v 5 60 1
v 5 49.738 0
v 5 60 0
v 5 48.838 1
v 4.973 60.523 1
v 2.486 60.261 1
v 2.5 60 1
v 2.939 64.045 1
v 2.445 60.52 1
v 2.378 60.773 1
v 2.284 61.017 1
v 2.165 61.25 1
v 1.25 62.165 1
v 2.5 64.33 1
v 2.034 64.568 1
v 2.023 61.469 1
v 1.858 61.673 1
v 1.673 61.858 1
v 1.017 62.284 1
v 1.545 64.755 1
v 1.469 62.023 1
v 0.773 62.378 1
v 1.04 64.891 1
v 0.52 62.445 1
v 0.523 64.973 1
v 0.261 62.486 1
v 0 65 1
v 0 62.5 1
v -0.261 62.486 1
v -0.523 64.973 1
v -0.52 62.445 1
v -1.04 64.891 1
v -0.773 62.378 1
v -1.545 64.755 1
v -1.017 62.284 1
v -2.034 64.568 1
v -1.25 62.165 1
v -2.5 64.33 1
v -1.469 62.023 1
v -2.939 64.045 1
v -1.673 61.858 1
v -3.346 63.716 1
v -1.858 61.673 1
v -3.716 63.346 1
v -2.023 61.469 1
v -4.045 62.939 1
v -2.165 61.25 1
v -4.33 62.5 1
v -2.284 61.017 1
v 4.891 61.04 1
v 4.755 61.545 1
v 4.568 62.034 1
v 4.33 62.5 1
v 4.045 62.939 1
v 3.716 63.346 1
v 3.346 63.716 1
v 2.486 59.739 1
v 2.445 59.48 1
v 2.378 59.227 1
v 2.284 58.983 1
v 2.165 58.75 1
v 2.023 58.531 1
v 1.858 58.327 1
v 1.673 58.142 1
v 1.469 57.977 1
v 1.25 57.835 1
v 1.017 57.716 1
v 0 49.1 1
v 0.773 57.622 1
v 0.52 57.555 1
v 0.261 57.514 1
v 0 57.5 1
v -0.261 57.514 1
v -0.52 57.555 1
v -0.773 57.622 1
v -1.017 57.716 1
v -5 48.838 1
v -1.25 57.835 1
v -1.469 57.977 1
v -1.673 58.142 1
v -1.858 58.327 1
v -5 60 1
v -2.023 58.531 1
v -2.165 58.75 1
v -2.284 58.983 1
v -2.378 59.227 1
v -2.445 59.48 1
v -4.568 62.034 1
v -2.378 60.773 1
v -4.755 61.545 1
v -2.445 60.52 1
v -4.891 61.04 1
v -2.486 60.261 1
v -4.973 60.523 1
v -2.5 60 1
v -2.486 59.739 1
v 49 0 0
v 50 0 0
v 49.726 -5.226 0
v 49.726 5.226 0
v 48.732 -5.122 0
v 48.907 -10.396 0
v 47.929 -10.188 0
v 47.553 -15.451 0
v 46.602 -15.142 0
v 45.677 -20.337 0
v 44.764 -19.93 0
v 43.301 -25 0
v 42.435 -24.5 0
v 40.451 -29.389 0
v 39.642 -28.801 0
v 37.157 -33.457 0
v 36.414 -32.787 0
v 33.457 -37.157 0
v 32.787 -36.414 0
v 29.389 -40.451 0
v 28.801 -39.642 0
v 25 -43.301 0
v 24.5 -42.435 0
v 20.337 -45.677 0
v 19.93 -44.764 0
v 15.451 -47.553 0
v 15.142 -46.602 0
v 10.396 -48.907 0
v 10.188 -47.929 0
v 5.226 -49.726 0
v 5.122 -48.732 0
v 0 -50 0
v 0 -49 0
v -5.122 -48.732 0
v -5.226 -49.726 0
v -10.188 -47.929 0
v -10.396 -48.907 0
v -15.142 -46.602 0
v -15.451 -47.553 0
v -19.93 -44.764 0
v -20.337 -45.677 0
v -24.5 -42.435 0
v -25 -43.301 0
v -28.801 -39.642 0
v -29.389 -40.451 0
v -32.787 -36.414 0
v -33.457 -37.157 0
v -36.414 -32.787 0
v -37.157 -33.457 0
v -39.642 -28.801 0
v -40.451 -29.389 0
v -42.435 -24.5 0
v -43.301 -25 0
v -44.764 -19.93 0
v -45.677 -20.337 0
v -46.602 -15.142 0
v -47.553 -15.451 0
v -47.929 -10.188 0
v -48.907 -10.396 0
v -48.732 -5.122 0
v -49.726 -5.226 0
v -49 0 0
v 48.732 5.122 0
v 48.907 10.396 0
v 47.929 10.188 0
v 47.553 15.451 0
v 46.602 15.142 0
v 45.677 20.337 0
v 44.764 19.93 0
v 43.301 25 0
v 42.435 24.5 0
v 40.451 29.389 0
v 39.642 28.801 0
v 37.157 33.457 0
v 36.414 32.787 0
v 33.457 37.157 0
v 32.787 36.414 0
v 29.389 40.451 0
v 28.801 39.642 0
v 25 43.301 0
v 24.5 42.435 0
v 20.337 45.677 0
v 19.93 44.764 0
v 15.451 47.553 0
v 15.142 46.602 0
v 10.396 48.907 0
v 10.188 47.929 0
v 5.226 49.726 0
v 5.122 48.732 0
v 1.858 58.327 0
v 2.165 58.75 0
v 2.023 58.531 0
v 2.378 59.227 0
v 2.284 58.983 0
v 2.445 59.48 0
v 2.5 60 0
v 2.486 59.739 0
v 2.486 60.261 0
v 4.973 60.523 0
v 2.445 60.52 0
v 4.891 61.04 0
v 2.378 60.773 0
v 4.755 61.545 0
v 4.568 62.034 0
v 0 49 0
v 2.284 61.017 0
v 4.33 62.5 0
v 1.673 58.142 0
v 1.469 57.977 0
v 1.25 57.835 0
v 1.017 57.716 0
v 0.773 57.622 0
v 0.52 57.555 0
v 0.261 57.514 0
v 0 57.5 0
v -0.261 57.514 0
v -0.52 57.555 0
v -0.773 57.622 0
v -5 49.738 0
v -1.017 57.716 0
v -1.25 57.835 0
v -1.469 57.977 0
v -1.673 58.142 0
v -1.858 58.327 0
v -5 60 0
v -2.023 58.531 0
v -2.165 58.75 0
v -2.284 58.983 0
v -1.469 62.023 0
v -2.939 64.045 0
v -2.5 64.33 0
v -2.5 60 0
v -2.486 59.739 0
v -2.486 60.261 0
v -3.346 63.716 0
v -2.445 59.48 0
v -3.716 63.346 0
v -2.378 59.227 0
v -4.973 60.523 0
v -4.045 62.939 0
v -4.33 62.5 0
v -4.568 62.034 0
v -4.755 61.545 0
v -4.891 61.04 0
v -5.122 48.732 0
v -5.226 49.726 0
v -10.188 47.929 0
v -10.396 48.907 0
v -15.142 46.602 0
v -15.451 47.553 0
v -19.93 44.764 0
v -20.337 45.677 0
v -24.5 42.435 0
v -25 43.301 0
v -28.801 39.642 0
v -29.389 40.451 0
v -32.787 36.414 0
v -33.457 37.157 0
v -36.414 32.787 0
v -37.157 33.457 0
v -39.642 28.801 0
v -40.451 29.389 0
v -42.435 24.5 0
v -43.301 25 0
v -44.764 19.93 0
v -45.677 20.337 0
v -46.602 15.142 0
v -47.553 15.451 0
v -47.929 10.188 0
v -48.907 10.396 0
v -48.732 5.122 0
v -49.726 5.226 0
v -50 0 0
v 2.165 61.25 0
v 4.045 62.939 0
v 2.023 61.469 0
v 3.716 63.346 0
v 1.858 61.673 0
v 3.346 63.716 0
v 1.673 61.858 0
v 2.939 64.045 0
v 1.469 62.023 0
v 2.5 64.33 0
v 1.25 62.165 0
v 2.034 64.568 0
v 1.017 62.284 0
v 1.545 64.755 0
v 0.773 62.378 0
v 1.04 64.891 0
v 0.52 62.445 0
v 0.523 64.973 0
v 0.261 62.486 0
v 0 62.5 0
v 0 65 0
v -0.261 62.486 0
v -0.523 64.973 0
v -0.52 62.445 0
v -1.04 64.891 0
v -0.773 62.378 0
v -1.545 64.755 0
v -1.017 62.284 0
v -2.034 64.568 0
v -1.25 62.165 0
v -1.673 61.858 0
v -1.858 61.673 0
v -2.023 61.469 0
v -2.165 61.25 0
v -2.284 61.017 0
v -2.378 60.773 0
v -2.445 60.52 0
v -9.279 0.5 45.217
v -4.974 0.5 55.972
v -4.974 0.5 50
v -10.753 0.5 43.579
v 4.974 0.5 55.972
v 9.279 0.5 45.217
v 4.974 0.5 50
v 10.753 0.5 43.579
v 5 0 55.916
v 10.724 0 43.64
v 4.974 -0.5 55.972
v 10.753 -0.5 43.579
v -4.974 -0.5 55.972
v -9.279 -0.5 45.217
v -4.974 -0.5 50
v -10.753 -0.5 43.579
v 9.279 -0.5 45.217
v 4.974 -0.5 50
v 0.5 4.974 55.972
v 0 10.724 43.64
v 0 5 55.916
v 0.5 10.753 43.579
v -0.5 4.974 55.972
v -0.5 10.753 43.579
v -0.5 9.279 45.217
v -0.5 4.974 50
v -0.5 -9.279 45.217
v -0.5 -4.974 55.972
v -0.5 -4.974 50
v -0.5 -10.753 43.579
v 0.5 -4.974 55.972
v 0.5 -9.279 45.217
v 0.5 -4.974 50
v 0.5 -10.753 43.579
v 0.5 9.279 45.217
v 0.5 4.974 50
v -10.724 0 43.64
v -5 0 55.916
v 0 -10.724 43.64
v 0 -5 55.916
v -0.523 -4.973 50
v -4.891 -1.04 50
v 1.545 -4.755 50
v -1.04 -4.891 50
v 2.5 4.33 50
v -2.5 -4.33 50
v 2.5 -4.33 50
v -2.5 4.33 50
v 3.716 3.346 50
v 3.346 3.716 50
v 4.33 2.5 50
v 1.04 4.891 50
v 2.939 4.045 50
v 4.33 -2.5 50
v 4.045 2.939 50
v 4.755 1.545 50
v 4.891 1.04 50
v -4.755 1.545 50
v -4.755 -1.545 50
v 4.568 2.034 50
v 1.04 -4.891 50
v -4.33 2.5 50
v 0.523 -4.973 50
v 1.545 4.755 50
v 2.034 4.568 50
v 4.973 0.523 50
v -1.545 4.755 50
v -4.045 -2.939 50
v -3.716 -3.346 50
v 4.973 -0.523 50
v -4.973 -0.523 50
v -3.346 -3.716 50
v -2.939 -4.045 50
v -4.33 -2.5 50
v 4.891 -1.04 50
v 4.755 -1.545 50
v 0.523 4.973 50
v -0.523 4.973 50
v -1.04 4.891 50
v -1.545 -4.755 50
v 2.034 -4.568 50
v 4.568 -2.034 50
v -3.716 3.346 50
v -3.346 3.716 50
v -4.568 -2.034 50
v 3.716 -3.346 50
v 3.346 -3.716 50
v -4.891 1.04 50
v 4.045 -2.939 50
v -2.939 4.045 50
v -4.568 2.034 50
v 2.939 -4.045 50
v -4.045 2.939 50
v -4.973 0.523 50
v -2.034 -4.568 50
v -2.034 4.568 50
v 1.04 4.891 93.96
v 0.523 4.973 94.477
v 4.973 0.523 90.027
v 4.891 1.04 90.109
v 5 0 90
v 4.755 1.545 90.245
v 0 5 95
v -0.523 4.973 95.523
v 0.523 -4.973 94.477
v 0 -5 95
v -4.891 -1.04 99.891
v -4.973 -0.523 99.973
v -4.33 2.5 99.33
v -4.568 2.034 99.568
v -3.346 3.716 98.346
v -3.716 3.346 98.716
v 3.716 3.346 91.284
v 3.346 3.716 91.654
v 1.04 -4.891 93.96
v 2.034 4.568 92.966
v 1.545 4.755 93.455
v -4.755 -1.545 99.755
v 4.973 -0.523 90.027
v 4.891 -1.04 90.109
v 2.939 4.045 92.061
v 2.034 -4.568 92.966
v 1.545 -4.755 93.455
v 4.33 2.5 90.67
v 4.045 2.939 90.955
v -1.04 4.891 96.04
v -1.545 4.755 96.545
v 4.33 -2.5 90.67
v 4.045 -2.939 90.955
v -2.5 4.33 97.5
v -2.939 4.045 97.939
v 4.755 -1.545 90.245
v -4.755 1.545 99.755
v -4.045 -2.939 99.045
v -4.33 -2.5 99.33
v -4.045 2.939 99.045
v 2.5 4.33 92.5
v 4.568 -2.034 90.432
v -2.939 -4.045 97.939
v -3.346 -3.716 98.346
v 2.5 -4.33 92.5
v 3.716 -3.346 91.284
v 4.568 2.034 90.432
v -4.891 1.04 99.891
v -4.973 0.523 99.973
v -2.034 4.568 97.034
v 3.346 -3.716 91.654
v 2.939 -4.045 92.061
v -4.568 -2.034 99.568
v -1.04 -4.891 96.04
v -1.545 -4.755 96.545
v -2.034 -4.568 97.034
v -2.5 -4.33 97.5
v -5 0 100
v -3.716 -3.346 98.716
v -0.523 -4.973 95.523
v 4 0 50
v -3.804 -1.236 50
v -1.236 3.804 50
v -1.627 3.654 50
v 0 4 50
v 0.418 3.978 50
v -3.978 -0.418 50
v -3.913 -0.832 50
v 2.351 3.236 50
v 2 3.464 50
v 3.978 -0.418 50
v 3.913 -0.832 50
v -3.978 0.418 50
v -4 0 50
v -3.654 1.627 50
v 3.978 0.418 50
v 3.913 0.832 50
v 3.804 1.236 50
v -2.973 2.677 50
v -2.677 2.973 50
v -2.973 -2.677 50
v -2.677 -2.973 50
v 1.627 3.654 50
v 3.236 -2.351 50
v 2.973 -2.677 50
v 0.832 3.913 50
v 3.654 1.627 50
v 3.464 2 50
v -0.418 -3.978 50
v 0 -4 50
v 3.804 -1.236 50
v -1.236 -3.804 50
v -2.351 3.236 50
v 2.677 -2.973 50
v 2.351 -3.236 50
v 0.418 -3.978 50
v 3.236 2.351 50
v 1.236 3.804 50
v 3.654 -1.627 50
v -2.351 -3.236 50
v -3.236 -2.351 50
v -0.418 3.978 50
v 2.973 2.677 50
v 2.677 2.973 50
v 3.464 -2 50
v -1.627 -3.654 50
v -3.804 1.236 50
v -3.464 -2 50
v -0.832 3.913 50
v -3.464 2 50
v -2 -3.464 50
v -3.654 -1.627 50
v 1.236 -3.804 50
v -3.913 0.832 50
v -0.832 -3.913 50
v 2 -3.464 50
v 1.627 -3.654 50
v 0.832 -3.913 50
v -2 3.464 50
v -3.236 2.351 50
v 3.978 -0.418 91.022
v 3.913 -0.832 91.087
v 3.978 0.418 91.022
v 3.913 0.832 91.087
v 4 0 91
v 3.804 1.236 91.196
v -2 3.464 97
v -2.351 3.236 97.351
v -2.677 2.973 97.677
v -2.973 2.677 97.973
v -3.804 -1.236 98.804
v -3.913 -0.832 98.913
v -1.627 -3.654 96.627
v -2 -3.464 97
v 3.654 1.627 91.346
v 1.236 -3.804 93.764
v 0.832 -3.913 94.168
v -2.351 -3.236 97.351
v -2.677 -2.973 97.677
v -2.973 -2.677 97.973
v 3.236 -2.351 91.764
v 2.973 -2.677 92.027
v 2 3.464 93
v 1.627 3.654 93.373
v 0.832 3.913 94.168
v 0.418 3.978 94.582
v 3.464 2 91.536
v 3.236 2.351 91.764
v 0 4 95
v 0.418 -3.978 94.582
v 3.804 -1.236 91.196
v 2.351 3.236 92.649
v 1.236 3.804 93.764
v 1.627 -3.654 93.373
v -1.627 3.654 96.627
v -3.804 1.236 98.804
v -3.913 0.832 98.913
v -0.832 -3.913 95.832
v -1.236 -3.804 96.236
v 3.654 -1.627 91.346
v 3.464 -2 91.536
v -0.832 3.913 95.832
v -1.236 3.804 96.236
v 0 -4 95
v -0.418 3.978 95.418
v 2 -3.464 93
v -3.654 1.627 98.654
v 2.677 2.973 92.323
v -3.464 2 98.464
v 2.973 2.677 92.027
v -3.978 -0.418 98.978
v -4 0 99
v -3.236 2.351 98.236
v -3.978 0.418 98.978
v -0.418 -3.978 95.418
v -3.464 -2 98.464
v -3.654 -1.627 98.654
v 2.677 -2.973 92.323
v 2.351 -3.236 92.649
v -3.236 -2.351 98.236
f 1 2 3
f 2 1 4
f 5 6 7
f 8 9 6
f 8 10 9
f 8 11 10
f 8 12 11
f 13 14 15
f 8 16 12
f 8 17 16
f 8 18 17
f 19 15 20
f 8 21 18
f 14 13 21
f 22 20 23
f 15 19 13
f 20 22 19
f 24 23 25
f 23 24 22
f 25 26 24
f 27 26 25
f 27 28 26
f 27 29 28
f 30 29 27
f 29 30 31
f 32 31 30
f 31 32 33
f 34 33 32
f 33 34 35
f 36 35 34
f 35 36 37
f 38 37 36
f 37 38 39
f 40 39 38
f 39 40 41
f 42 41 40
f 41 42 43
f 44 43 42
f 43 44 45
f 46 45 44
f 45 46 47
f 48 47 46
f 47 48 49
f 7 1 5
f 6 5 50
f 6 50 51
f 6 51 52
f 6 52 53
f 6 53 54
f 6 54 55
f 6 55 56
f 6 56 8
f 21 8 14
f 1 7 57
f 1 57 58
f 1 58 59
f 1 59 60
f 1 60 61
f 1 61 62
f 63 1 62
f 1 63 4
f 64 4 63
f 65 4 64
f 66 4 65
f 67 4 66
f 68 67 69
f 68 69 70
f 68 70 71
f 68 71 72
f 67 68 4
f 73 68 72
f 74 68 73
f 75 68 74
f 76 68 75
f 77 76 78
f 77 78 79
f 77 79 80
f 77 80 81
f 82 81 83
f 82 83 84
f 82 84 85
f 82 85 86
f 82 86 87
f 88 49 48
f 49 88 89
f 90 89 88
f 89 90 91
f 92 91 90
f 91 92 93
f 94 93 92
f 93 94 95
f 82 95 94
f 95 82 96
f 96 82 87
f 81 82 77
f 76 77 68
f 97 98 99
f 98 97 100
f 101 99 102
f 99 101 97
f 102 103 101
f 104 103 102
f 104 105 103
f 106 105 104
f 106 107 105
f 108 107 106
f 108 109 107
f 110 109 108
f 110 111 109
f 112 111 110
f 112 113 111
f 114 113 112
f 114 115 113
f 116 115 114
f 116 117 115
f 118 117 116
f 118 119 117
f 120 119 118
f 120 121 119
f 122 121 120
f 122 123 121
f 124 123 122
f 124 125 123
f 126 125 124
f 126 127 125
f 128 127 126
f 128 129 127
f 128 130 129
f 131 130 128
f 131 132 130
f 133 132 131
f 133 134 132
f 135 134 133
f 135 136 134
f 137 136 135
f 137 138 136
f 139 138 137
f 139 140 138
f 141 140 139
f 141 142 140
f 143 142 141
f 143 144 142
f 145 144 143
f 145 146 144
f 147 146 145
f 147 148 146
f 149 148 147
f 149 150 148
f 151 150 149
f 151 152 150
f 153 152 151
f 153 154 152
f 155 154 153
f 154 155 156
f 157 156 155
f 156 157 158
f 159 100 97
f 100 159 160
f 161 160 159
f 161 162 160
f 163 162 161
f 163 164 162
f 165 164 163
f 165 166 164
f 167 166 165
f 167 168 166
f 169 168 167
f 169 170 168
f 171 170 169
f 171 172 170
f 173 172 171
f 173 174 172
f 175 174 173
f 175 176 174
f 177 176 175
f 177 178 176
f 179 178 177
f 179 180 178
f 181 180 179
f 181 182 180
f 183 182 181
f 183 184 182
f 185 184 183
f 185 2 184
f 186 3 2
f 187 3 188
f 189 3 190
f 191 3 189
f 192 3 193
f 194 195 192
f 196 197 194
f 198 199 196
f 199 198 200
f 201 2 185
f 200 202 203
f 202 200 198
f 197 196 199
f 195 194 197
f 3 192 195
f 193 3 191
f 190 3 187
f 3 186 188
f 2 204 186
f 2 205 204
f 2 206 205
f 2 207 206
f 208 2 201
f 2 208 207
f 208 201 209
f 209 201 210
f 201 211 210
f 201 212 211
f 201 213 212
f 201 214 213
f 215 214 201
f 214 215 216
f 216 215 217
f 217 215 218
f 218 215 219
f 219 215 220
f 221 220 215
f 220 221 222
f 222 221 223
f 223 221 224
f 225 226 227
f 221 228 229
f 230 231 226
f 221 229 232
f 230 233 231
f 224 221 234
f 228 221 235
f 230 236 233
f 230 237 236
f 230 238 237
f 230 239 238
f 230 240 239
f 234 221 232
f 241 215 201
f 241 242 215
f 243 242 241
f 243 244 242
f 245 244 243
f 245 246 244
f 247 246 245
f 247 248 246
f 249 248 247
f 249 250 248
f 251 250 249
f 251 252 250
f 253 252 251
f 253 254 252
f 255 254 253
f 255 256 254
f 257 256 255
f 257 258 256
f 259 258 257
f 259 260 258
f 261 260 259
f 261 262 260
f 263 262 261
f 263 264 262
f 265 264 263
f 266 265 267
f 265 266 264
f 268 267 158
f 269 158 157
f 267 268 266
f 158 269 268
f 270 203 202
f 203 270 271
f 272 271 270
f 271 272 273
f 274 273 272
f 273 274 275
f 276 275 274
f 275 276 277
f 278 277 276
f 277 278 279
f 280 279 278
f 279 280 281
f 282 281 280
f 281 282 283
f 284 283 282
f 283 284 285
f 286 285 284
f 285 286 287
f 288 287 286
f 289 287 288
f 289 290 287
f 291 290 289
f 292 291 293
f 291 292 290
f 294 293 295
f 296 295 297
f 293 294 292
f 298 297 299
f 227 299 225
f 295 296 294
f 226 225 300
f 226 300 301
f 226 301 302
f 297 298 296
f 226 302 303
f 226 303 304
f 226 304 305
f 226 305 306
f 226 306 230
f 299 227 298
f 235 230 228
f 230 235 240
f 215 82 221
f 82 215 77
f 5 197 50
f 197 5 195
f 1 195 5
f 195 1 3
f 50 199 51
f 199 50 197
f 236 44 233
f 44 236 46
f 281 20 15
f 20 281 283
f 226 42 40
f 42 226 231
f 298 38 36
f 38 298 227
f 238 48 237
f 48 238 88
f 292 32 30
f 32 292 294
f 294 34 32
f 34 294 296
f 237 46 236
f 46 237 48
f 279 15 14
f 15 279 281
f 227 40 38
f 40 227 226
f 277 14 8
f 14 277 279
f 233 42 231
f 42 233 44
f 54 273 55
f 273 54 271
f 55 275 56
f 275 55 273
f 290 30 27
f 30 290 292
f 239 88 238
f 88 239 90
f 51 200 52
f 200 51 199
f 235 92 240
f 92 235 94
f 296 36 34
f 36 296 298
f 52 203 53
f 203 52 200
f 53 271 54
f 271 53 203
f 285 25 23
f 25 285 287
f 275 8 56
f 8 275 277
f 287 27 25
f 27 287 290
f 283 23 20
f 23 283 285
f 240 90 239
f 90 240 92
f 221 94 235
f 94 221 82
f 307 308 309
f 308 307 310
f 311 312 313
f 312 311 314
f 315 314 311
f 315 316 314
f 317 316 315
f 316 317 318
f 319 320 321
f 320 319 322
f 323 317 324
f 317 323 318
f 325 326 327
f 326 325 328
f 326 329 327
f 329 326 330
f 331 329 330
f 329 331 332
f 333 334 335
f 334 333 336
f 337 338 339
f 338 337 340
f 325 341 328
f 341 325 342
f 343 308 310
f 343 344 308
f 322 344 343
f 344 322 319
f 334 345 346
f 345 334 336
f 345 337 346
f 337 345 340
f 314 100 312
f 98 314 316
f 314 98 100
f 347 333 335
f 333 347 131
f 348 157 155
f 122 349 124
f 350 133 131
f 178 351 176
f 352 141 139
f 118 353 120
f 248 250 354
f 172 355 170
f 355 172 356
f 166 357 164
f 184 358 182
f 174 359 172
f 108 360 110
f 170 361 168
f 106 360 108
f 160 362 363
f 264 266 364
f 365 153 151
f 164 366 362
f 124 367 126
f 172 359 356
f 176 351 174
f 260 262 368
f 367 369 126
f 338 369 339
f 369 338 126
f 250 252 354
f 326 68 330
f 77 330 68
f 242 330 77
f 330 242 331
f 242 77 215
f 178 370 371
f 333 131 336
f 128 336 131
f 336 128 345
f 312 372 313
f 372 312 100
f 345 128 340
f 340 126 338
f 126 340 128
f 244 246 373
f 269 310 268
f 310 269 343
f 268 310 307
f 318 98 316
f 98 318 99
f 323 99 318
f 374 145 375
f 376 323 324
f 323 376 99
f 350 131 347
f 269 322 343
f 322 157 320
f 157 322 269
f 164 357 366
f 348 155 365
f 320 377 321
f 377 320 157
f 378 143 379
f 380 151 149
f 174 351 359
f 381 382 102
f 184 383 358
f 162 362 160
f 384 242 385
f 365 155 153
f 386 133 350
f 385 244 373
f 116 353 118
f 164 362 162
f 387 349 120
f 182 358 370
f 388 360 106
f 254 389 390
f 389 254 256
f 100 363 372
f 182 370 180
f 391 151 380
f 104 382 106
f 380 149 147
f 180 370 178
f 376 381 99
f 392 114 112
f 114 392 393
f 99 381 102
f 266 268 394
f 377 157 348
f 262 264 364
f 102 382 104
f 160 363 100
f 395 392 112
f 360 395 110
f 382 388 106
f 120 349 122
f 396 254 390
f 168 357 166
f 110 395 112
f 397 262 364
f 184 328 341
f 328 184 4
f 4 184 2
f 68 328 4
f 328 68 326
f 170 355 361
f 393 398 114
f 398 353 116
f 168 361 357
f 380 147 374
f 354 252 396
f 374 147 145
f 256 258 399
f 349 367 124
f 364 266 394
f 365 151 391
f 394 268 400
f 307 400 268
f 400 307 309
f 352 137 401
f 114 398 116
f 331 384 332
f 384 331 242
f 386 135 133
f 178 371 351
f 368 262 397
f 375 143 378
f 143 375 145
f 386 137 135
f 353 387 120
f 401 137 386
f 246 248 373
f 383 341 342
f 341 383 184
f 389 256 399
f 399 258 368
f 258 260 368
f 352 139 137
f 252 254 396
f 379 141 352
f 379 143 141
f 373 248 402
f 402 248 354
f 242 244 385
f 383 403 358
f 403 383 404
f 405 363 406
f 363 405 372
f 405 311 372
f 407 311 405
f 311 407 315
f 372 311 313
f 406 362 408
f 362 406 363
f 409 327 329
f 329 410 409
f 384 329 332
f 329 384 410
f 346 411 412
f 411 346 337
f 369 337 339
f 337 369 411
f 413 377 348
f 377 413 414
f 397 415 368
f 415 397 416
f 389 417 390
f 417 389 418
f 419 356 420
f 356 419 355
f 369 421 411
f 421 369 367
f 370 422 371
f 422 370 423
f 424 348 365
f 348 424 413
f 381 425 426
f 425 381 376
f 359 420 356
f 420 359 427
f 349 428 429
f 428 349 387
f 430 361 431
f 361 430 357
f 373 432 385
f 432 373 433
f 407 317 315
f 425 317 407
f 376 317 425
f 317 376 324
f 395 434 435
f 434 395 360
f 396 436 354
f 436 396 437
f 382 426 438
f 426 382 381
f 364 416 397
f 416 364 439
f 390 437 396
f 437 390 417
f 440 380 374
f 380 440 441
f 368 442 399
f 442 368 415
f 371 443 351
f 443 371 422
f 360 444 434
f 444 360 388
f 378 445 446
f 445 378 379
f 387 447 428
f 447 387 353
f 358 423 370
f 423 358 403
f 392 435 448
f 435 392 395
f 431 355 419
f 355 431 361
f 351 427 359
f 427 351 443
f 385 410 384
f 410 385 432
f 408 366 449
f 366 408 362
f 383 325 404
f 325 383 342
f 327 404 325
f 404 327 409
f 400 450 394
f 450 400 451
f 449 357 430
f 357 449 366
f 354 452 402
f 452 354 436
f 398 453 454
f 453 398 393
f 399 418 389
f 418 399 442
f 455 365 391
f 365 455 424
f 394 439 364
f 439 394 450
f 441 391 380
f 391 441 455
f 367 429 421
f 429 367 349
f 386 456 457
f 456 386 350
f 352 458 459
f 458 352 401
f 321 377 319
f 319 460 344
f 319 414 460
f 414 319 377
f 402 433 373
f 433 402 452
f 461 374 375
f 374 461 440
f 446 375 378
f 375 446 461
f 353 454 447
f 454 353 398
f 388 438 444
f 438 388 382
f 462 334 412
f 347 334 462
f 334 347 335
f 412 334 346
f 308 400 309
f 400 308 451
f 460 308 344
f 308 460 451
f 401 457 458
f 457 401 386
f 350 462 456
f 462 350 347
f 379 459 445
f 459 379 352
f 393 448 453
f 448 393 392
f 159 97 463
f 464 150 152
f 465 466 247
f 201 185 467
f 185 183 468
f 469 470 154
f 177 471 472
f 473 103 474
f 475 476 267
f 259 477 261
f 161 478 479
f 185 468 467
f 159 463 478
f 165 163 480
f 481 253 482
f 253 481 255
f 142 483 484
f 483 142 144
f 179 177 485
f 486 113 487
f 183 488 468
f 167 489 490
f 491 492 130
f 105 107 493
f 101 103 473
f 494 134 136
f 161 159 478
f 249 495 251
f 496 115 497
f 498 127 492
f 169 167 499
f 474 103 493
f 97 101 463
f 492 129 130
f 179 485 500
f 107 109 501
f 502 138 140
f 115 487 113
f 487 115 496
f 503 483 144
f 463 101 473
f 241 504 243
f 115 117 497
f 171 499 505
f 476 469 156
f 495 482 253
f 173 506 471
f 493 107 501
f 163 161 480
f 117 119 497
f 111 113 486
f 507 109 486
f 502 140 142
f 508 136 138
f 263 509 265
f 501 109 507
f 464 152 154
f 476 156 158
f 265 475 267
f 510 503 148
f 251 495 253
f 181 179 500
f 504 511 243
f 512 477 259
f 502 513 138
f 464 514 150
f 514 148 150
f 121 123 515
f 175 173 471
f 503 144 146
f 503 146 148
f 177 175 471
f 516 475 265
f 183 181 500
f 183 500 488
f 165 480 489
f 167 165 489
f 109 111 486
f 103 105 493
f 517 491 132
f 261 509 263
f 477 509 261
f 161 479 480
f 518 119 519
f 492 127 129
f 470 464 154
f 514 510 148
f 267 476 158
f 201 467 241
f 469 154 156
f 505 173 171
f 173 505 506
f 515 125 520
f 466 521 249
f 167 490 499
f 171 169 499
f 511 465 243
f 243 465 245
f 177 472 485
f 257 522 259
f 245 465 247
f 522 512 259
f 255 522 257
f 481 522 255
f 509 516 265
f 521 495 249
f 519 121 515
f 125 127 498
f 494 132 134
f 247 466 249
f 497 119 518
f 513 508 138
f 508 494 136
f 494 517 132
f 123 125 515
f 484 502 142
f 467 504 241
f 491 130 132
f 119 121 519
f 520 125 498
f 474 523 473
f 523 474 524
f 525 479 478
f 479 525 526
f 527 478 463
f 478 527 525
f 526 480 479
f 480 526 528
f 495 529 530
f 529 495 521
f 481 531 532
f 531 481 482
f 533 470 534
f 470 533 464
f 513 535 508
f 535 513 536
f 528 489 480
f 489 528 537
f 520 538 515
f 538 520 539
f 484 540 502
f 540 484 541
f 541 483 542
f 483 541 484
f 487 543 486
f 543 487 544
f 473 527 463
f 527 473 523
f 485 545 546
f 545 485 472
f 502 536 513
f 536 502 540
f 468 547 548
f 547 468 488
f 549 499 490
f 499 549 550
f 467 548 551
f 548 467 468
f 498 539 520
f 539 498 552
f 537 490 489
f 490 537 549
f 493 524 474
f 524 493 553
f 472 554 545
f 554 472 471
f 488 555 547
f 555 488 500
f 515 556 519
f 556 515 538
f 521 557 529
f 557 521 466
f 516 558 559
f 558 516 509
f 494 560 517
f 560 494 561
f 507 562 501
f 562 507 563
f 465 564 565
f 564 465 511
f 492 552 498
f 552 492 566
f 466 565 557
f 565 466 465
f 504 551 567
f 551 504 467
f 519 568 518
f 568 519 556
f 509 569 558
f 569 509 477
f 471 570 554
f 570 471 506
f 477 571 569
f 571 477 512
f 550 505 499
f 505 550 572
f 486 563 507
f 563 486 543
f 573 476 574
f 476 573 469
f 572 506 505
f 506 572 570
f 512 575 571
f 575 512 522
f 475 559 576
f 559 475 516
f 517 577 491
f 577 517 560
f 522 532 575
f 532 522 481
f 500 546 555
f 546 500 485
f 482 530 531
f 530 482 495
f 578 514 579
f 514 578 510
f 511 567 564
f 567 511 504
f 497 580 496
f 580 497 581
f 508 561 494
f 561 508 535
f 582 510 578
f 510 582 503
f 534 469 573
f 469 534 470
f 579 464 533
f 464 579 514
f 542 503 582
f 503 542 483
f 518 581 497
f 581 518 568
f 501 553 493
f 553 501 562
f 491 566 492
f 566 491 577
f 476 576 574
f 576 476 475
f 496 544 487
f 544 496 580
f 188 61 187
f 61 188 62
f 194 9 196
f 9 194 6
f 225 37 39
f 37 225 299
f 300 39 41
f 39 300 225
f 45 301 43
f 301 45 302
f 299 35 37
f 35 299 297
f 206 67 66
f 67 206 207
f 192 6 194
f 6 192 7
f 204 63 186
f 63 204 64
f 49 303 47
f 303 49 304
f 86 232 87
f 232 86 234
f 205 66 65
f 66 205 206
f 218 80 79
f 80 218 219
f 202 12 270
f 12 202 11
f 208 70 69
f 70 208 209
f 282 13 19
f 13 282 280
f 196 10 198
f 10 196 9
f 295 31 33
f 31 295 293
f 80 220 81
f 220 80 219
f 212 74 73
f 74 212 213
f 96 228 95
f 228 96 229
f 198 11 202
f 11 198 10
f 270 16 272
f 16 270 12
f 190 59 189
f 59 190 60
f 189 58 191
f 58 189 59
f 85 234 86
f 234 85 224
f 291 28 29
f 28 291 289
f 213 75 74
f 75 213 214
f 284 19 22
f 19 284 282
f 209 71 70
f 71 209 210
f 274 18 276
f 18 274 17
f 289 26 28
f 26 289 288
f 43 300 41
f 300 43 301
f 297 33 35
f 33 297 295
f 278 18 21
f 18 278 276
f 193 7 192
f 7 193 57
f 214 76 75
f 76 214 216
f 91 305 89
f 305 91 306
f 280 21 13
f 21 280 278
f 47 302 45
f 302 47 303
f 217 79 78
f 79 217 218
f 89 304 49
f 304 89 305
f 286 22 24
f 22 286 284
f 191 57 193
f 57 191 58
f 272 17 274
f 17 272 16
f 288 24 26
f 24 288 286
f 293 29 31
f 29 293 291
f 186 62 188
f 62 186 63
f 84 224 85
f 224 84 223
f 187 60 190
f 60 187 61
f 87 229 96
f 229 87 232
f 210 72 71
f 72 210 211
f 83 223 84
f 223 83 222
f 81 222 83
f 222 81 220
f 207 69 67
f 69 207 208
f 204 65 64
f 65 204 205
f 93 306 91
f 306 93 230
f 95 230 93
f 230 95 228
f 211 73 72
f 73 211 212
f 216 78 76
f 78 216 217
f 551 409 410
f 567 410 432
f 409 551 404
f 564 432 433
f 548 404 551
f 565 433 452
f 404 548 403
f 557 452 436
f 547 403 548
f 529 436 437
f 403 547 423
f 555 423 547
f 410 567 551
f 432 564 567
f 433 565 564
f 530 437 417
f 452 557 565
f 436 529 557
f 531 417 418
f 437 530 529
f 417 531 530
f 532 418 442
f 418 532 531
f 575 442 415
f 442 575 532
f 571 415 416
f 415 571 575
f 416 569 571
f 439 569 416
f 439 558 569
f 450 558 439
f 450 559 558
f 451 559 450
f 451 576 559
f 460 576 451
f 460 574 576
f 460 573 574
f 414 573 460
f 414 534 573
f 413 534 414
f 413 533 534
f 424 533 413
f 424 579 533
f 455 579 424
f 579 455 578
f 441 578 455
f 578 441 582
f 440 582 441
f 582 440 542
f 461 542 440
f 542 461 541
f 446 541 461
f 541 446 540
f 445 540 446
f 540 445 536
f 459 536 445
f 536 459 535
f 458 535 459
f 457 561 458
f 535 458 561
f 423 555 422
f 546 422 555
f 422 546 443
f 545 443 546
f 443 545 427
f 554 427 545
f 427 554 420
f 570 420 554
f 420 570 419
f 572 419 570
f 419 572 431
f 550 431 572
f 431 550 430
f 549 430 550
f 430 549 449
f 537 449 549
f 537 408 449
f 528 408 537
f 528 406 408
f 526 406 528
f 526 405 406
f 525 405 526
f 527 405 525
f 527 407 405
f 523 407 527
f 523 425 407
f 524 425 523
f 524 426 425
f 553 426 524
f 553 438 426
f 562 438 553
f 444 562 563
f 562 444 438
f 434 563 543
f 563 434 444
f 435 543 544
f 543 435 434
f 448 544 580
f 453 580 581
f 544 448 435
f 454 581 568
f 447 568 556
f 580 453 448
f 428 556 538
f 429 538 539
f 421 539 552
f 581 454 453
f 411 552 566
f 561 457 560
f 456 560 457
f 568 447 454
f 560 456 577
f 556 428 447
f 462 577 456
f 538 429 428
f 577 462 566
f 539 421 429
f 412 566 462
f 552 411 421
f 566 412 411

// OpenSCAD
/* [Funnel] */

fine = 60; // [20:100]
show_Hanger = "yes"; // [yes,no]
show_Gab = "yes"; // [yes,no]
WallThickness = 1; // [1:3]

// Which one would you like to see?




HighFunnel =50; // [30:150]
DiameterTop = 100; // [40:150]



DiameterPipe = 10; // [6:20]
HighPipe =50; // [30:80]
BeveledTip = "yes"; // [yes,no]

// ignore variable values

/* [Hidden] */
Spitze = 45;

$fn = fine;
Hoehe = (HighPipe + HighFunnel) / 2;
Ghoehe = (HighPipe + HighFunnel);
ra2 = DiameterPipe/2;

schr=ra2*5;

ra1 = DiameterTop;
Wand = WallThickness;

Hy = (ra2*2)/cos(Spitze);
LuftW = 110 - atan((ra1/2)/HighFunnel);
echo (LuftW);

difference()
{
union() {
//Trichter    
    translate([0,0,HighFunnel/2])
    cylinder(r1=ra1/2,r2=ra2,h=HighFunnel, center = true);

//Lasche
if (show_Hanger=="yes"){    
    translate([0,ra1/2,Wand/2])
    cube(size = [ra1/10,ra1/5,Wand], center = true);    
    translate([0,ra1/2+ra1/10,Wand/2])
    cylinder(r=ra1/20,h=Wand, center = true); 
} 

//Rohr 

    translate([0,0,Ghoehe-(HighPipe/2)])
    cylinder(r=ra2,h=HighPipe, center = true);  
  
//Gab
if (show_Gab=="yes"){ 
    translate([ra2,0,HighFunnel])
    rotate(a=[0,LuftW,0])
    cube(size = [Hoehe/(1/ra2/.1),Wand,ra2], center = true);

    translate([0,ra2,HighFunnel])
    rotate(a=[0,LuftW,90])
    cube(size = [Hoehe/(1/ra2/.1),Wand,ra2], center = true);
  
    translate([-ra2,0,HighFunnel])
    rotate(a=[0,LuftW,180])
    cube(size = [Hoehe/(1/ra2/.1),Wand,ra2], center = true);
  
    translate([0,-ra2,HighFunnel])
    rotate(a=[0,LuftW,270])
    cube(size = [Hoehe/(1/ra2/.1),Wand,ra2], center = true);  
} 
}

//Loch Trichter
    translate([0,0,HighFunnel/2])
    cylinder(r1=ra1/2-Wand,r2=ra2-Wand,h=HighFunnel, center = true);
// Loch Rohr
    translate([0,0,Ghoehe-(HighPipe/2)])
    cylinder(r=ra2-Wand,h=Hoehe, center = true);

// Loch in der Lasche
if (show_Hanger=="yes"){
    translate([0,ra1/2+ra1/10,Wand/2])
    cylinder(r=ra1/40,h=Wand, center = true);
}

//Spitze
if (BeveledTip=="yes"){
    
    translate([ra2*1,0,(HighPipe + HighFunnel)])
    rotate(a=[0,Spitze,0])
    cube(size = [Hy*1.0,ra2*2,Hy*1.0], center = true);
}
}
